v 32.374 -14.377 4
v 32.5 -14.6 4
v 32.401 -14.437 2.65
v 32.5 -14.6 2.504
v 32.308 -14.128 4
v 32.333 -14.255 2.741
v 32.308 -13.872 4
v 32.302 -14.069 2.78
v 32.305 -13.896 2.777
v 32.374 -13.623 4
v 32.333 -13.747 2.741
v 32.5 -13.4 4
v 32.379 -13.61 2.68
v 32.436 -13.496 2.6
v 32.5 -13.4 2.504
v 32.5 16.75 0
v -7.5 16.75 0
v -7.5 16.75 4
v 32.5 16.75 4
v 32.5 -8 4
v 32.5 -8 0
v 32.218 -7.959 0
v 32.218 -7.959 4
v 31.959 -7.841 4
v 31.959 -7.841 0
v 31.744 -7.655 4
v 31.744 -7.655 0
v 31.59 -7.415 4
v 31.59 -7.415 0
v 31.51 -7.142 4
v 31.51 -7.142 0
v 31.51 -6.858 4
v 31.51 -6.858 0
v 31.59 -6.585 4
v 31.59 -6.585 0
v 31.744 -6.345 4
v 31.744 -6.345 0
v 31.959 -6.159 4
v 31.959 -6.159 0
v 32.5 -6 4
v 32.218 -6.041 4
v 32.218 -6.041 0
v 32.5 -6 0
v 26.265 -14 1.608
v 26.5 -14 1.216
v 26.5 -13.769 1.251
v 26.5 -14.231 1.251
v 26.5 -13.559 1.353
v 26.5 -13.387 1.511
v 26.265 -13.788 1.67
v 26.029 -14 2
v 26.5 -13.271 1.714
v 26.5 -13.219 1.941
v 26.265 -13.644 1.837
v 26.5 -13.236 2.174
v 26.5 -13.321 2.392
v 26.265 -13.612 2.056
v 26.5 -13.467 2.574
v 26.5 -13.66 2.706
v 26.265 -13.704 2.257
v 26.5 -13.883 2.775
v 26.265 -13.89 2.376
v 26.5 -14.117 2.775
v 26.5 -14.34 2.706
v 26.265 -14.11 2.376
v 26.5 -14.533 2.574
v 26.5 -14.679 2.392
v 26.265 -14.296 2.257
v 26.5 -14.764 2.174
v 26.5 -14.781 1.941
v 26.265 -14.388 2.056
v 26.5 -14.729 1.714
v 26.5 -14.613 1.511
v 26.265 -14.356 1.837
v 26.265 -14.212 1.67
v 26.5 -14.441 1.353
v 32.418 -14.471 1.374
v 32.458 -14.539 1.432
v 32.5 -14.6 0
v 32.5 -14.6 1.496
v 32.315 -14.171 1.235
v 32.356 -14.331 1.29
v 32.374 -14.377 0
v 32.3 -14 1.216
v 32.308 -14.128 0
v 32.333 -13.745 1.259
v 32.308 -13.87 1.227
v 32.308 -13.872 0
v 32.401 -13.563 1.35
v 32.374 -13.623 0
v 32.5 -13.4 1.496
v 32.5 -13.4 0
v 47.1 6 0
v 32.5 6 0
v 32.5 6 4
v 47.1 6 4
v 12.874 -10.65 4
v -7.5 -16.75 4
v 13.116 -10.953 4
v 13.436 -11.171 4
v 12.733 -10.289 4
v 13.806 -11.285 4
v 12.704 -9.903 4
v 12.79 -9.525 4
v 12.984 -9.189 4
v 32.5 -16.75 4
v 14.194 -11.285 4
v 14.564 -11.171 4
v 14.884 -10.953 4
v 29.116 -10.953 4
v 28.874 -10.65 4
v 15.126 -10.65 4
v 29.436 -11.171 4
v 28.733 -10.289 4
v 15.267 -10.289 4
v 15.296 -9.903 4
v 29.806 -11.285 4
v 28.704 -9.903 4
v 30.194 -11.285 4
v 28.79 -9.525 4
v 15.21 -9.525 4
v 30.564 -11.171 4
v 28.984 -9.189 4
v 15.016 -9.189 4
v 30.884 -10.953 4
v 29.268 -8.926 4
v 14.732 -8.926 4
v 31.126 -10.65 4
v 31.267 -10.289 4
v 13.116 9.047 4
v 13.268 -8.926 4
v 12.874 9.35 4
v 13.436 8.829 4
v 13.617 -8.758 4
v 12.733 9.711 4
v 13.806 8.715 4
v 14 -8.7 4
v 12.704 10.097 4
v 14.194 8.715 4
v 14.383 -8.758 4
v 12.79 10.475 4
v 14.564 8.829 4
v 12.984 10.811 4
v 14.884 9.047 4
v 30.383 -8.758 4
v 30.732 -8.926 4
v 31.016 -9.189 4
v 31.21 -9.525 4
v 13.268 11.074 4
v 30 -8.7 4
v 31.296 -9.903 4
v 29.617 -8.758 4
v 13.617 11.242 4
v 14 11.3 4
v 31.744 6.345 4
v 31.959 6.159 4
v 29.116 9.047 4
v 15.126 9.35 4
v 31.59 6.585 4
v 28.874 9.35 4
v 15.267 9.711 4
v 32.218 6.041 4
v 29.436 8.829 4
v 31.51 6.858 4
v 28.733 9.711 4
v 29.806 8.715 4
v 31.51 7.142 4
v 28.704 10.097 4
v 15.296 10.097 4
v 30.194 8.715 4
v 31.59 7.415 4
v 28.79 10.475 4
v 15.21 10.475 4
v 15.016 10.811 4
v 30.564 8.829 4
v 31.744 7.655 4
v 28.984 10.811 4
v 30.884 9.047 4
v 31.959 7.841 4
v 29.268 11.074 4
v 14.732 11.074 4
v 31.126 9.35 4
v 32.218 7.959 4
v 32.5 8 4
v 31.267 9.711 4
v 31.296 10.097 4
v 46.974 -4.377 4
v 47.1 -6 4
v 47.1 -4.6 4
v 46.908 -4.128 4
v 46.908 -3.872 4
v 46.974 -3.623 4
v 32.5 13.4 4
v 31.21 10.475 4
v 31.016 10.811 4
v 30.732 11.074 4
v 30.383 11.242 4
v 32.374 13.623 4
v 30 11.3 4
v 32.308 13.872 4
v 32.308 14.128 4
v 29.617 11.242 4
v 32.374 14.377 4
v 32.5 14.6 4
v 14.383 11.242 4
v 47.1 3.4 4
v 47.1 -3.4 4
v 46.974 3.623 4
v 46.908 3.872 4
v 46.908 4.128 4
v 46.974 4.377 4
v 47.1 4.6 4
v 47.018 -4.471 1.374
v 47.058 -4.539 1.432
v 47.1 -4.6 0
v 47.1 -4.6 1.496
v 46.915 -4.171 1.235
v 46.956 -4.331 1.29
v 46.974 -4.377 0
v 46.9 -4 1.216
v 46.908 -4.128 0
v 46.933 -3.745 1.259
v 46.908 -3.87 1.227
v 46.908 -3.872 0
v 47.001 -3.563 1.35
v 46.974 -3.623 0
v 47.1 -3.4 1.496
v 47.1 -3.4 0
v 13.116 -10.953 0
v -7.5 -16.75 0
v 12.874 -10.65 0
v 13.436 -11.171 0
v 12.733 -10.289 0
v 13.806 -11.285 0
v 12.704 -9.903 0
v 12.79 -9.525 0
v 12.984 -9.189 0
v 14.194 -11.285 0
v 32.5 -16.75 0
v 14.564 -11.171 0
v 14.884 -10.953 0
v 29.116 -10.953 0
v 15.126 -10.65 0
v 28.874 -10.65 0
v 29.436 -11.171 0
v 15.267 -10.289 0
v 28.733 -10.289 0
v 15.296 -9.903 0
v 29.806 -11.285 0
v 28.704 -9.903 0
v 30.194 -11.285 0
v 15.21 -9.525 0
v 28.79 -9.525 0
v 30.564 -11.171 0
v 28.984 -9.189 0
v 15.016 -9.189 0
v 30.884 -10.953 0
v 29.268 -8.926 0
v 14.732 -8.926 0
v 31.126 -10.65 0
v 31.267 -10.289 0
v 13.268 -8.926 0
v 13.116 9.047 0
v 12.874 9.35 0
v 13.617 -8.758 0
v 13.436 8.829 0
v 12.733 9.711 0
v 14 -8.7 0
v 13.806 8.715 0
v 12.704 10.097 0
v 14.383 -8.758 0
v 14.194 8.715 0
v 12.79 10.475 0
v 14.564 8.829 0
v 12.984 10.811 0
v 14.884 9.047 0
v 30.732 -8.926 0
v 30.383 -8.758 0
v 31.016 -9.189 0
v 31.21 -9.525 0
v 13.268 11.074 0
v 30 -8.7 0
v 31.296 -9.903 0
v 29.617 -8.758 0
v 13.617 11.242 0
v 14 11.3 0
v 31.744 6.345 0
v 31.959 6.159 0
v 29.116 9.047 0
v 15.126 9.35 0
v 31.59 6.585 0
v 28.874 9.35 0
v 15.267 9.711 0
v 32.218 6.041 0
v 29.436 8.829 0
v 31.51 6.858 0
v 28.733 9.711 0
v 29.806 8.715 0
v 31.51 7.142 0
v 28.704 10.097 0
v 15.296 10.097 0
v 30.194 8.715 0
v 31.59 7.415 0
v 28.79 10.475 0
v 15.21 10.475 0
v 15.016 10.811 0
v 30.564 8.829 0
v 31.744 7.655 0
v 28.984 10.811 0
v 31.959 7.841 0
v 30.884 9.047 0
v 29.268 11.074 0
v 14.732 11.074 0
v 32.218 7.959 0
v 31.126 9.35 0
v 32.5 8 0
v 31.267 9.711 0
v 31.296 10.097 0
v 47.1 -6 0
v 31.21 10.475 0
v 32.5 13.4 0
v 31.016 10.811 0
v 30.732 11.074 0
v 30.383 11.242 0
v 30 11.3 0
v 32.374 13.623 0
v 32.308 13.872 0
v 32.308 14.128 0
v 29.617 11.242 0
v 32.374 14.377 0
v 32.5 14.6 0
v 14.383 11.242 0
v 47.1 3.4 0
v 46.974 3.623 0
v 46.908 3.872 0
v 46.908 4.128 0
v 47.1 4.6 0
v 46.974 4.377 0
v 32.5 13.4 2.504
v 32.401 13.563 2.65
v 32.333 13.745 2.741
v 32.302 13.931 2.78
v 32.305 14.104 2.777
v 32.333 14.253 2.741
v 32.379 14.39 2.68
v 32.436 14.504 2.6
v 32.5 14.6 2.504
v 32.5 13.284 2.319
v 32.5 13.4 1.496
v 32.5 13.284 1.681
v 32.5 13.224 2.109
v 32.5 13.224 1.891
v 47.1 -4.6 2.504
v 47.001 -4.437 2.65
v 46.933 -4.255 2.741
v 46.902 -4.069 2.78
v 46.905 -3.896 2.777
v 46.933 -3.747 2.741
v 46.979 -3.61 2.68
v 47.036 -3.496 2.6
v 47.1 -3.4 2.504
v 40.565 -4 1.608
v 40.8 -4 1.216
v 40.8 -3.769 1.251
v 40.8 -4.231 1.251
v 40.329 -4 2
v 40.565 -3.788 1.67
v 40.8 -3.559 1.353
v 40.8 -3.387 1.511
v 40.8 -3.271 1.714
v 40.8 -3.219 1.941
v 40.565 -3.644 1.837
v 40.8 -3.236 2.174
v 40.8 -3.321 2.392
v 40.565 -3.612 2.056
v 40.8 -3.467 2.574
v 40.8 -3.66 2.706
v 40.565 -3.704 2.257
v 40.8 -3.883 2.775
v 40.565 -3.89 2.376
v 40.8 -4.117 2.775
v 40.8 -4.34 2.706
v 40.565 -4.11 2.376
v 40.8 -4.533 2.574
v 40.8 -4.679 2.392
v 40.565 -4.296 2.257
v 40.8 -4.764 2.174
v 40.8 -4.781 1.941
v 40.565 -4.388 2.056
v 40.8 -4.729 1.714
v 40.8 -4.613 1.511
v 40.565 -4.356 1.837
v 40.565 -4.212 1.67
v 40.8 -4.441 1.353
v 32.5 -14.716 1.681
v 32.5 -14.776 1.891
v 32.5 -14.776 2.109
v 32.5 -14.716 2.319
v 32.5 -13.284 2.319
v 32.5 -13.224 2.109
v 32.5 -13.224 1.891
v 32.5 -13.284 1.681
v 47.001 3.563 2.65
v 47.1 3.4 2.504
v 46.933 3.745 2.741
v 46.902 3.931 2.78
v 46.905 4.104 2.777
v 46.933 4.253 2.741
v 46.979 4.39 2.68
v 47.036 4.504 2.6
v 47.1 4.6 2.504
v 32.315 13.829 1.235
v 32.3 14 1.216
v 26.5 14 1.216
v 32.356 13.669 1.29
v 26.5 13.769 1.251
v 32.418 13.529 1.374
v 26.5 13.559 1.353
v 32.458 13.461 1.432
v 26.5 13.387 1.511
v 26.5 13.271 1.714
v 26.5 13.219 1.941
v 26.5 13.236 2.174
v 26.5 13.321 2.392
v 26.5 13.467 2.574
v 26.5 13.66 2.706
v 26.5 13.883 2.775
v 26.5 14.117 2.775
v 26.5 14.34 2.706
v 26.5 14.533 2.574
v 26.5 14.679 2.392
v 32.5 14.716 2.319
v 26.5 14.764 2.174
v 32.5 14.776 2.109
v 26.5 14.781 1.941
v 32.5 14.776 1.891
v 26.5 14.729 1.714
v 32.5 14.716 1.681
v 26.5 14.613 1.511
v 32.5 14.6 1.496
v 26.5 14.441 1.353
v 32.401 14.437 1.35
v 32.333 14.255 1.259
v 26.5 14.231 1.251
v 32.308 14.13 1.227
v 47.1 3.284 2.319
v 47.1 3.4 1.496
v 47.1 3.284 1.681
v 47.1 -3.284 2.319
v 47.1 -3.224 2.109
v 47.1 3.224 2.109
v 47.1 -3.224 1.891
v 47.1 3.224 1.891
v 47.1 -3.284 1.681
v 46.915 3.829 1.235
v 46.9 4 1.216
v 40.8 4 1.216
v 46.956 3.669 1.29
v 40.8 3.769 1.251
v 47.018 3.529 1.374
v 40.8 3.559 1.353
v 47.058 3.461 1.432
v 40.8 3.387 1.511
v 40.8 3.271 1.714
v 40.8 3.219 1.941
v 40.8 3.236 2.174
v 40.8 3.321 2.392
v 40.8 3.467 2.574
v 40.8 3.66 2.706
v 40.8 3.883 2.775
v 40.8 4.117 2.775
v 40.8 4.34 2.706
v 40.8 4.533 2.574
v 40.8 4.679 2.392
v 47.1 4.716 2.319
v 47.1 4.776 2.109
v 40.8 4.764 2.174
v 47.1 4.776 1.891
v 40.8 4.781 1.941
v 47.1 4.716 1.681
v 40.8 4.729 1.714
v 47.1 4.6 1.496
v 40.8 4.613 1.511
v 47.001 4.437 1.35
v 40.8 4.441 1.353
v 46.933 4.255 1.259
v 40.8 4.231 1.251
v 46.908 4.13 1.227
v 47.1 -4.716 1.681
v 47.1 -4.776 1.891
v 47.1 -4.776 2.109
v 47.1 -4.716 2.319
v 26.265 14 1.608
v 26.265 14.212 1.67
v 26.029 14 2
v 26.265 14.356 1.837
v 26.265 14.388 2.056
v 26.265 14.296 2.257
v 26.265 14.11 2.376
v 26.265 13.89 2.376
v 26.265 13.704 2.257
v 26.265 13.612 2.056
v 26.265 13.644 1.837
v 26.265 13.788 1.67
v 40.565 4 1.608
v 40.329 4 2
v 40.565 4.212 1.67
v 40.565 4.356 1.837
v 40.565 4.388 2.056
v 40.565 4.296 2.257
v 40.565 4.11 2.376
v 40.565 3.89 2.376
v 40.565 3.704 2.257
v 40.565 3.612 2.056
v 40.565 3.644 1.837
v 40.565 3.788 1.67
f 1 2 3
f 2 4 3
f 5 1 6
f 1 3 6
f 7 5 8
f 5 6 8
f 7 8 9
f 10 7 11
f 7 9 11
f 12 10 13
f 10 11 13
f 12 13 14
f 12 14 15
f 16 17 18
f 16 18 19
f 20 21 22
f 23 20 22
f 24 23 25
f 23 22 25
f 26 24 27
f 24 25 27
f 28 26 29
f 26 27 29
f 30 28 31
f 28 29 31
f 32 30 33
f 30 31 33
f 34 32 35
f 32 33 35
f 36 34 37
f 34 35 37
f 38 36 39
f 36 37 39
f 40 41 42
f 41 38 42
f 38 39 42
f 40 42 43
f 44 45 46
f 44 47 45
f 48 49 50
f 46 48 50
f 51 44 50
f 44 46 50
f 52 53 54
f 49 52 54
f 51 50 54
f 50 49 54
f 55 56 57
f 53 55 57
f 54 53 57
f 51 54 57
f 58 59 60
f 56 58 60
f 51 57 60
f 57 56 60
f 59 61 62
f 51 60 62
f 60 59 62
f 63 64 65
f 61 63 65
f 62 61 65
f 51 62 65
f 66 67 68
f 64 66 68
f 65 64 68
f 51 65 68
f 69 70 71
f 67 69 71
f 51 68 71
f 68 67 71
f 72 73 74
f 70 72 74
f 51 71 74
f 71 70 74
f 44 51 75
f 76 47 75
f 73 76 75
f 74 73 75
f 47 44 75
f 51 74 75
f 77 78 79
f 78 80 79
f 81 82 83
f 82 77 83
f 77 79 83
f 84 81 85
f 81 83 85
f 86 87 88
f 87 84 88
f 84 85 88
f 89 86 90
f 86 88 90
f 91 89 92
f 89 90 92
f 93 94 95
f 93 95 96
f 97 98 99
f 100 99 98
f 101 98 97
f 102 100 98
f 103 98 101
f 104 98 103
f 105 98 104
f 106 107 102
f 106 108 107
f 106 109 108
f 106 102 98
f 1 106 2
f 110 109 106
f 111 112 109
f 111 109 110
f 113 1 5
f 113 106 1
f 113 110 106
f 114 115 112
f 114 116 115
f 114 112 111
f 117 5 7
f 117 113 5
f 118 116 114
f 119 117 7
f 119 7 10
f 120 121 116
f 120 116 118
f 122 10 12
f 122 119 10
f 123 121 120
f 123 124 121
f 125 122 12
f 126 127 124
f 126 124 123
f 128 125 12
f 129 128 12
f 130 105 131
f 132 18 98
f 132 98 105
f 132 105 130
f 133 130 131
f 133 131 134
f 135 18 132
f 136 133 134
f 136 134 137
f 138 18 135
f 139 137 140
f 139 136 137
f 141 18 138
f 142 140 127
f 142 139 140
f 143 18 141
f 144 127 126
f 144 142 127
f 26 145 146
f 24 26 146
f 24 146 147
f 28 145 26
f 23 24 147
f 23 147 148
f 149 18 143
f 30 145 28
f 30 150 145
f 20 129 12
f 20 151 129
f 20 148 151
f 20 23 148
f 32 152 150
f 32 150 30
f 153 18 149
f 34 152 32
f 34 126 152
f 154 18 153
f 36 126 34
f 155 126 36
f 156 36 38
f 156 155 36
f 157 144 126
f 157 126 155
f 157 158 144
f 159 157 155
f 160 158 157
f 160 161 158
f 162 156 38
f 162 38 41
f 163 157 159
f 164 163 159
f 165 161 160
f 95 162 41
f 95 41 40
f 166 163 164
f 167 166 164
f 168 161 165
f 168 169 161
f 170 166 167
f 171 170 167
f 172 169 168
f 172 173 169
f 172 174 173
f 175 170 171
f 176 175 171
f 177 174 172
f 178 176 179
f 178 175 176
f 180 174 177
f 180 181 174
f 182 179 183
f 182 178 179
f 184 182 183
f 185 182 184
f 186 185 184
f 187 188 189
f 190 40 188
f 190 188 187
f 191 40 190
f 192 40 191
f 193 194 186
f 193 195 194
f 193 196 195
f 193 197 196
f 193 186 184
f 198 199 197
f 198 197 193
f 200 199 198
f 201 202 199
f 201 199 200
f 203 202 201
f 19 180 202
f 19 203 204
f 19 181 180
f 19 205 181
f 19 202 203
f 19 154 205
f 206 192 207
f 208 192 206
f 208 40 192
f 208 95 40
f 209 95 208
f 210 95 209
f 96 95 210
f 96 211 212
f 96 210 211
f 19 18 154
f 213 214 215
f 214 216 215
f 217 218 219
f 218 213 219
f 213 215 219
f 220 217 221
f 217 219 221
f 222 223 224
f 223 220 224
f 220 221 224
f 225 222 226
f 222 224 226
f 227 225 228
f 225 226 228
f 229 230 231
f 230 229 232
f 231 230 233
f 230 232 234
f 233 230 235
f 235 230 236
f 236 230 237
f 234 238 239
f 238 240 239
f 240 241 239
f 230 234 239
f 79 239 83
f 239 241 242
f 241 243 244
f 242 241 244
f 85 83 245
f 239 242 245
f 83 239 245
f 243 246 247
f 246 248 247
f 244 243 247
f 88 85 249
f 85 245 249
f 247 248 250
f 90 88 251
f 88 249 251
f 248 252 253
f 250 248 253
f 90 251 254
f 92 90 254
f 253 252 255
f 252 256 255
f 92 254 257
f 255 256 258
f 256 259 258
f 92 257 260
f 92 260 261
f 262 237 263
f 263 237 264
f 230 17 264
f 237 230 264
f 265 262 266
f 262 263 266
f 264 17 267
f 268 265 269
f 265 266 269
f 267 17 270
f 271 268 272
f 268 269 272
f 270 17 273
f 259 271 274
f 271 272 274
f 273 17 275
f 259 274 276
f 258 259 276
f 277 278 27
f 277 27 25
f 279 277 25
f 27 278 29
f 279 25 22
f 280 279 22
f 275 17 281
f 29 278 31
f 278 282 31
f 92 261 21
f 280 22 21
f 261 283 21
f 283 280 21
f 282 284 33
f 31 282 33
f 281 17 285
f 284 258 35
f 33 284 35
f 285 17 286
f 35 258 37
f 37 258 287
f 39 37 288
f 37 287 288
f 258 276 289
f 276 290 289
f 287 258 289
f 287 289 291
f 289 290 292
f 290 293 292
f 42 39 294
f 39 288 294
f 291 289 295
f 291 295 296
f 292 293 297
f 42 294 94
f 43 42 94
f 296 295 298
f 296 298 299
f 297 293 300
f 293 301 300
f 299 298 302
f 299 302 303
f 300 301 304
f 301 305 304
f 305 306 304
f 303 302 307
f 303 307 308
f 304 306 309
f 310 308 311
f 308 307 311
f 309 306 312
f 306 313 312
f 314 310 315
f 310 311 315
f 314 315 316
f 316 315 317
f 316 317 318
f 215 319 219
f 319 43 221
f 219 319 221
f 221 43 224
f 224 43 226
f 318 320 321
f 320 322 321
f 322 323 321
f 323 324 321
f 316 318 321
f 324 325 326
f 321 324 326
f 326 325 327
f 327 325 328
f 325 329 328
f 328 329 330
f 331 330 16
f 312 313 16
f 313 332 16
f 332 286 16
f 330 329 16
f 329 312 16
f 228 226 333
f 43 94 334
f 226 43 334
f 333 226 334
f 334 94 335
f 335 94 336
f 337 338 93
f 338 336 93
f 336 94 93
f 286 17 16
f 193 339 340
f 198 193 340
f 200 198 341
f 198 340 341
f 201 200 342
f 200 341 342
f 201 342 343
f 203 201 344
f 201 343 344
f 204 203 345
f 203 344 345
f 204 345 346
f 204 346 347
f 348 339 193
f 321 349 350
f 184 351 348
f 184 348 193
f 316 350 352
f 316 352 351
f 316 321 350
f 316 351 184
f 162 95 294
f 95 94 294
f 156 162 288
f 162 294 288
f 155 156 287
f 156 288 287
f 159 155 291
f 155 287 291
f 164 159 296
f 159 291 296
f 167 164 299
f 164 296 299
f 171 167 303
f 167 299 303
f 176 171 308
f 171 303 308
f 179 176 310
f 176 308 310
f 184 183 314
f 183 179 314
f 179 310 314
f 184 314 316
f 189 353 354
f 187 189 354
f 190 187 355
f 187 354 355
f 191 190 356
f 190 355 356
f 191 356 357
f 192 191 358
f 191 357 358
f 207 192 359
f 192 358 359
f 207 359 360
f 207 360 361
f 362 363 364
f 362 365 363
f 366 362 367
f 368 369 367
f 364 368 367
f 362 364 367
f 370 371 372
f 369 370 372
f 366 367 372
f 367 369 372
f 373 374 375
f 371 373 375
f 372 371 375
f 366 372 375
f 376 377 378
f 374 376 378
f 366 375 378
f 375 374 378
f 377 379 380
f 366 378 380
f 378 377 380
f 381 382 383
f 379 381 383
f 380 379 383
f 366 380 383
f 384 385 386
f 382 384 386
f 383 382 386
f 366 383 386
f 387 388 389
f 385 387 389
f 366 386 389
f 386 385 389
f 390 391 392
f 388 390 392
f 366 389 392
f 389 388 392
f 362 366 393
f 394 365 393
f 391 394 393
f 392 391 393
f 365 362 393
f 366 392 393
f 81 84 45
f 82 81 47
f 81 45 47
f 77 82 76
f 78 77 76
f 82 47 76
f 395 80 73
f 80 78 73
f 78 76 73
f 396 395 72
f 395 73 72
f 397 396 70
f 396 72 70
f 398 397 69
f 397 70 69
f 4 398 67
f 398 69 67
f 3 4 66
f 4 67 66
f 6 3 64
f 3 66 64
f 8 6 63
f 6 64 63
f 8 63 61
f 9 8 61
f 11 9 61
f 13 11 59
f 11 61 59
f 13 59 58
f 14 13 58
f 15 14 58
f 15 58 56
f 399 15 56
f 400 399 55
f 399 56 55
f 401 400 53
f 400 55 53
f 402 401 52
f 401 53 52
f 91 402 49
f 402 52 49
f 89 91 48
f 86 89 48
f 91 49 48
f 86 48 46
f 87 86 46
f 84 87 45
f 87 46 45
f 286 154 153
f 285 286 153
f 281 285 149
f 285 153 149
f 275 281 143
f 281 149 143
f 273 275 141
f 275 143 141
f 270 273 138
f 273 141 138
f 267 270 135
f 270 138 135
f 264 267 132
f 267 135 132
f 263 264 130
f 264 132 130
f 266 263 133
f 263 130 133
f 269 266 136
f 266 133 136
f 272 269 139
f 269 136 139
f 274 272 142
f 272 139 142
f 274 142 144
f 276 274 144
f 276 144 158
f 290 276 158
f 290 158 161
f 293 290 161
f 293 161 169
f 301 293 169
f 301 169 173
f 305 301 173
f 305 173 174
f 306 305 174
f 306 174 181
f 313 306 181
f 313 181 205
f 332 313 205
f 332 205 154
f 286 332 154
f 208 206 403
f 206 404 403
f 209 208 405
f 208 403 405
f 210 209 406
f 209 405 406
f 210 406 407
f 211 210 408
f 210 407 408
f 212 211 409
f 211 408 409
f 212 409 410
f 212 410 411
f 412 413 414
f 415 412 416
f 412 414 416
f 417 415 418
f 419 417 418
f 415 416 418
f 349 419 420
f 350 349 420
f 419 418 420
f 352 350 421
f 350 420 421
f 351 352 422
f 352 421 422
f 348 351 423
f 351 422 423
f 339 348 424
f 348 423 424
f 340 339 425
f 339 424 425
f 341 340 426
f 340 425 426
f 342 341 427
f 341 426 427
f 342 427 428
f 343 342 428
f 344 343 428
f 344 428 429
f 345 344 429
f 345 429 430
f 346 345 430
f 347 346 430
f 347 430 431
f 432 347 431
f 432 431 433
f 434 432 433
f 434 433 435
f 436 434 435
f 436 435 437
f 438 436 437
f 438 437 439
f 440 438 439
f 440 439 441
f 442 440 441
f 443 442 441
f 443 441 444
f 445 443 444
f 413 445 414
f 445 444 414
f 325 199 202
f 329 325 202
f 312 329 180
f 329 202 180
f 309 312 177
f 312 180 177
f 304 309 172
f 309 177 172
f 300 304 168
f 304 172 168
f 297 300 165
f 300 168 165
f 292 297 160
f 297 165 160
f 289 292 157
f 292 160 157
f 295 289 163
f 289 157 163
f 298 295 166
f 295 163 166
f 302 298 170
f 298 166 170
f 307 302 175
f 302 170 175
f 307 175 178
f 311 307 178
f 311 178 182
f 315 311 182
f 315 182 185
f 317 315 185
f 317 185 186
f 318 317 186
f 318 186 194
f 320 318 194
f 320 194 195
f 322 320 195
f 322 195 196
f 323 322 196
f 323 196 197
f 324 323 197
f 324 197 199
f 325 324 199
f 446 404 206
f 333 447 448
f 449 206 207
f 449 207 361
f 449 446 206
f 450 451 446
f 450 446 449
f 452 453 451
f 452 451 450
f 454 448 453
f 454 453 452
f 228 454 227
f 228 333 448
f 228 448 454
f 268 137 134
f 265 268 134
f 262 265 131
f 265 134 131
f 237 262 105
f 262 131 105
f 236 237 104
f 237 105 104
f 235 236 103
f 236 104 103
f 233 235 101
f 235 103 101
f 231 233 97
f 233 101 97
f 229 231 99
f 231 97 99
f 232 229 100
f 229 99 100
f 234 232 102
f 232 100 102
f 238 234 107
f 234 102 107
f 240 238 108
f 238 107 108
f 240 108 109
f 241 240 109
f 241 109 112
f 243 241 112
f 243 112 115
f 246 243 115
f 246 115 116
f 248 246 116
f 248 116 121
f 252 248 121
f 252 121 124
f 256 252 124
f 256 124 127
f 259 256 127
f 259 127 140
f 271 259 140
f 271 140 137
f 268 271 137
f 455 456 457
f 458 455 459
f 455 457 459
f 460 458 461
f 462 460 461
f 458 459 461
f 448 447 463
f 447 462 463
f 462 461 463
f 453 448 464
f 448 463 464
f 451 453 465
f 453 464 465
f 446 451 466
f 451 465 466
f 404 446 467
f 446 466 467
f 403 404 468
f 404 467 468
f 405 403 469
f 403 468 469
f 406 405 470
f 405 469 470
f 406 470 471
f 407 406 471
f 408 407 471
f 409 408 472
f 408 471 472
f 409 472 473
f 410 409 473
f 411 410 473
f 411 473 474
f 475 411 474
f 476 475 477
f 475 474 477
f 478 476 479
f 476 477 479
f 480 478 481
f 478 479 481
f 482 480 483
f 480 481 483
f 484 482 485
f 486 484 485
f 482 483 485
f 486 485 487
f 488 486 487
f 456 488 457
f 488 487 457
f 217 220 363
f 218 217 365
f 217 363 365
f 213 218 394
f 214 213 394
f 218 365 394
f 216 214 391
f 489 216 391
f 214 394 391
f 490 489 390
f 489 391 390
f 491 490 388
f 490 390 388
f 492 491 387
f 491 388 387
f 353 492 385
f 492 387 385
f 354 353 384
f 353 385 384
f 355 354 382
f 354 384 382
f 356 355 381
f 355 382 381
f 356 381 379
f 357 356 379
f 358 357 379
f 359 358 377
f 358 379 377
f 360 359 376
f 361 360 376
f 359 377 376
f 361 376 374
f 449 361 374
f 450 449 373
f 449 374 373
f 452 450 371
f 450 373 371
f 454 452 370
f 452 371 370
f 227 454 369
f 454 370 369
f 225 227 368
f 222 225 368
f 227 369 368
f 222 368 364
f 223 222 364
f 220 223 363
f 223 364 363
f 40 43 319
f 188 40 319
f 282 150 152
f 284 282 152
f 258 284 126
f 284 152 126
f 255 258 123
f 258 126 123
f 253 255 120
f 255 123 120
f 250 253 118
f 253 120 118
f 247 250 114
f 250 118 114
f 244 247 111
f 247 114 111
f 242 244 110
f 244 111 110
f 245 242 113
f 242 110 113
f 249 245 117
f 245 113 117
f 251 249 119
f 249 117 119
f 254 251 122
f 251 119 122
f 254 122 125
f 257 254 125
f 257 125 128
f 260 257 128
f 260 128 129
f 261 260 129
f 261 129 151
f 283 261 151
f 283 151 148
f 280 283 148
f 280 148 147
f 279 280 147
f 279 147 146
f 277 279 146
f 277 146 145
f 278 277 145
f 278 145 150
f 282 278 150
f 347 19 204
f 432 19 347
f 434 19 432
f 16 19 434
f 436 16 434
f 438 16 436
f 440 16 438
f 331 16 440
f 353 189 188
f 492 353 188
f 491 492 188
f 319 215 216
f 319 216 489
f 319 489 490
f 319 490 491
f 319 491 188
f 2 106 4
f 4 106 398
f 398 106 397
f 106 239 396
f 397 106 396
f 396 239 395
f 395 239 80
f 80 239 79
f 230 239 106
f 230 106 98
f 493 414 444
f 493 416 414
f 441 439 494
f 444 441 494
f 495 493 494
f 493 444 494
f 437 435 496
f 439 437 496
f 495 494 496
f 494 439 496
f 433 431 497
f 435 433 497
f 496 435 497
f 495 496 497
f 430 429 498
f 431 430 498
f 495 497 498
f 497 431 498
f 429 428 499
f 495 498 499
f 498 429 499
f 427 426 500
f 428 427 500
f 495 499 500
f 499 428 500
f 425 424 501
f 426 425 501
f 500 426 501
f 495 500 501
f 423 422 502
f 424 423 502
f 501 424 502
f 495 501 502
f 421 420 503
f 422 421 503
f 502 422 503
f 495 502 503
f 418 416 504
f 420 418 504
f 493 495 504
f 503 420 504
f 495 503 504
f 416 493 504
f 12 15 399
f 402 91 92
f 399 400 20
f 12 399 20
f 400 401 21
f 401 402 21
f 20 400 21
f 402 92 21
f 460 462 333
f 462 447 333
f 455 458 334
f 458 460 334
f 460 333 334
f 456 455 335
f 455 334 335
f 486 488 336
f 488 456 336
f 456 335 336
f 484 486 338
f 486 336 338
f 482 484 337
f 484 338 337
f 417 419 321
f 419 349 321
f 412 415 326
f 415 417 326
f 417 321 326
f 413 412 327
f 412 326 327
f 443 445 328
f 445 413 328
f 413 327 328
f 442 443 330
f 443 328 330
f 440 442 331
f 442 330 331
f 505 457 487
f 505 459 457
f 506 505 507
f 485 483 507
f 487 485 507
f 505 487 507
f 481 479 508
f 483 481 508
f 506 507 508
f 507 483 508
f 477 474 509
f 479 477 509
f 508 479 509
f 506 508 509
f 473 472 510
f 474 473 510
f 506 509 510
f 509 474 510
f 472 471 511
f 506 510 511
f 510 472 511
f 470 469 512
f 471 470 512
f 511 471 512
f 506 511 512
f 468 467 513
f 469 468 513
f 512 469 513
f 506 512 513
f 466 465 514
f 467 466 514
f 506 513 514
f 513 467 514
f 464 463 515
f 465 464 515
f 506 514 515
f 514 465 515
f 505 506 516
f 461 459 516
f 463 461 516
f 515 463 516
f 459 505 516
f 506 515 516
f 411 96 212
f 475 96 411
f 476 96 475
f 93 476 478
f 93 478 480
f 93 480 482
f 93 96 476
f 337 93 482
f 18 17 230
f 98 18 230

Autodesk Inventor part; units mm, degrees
ref_plane "YZ Plane" through (0, 0, 0) normal (1, 0, 0) x (0, 1, 0)
ref_plane "XZ Plane" through (0, 0, 0) normal (0, 1, 0) x (-1, 0, 0)
ref_plane "XY Plane" through (0, 0, 0) normal (0, 0, 1) x (1, 0, 0)
sketch "スケッチ1" plane through (0, 0, 0) normal (0, 0, 1) x (1, 0, 0)
  line L0 (14, 10) -> (30, 10) construction
  line L1 (30, 10) -> (30, -10) construction
  line L2 (30, -10) -> (14, -10) construction
  line L3 (14, -10) -> (14, 10) construction
  line L4 (0, 0) -> (42.5052, 0) construction
  line L5 (-7.5, 16.75) -> (32.5, 16.75)
  line L6 (47.1, 6) -> (47.1, 4.6)
  line L7 (32.5, -16.75) -> (-7.5, -16.75)
  line L8 (32.5, 16.75) -> (32.5, 14.6)
  line L9 (32.5, 8) -> (32.5, 6) construction
  line L10 (32.5, 6) -> (47.1, 6)
  arc A0 (32.5, 8) -> (32.5, 6) centre (32.5, 7) ccw
  line L11 (32.5, -16.75) -> (32.5, -14.6)
  line L12 (32.5, -6) -> (47.1, -6)
  arc A1 (32.5, -6) -> (32.5, -8) centre (32.5, -7) ccw
  line L13 (32.5, 6) -> (32.5, -6) construction
  line L14 (32.5, -8) -> (32.5, -6) construction
  arc A2 (47.1, 4.6) -> (47.1, 3.4) centre (47.9, 4) ccw
  arc A3 (47.1, -3.4) -> (47.1, -4.6) centre (47.9, -4) ccw
  line L15 (47.1, 4.6) -> (47.1, 3.4) construction
  line L16 (47.1, 3.4) -> (47.1, -3.4)
  line L17 (47.1, -3.4) -> (47.1, -4.6) construction
  line L18 (47.1, -4.6) -> (47.1, -6)
  arc A4 (32.5, 14.6) -> (32.5, 13.4) centre (33.3, 14) ccw
  line L19 (32.5, 13.4) -> (32.5, 8)
  line L20 (32.5, 14.6) -> (32.5, 13.4) construction
  line L21 (33.7, 6) -> (33.7, -6) construction
  arc A5 (32.5, -13.4) -> (32.5, -14.6) centre (33.3, -14) ccw
  line L22 (32.5, -13.4) -> (32.5, -8)
  line L23 (32.5, -14.6) -> (32.5, -13.4) construction
  line L24 (-7.5, 16.75) -> (-7.5, -16.75)
  line L25 (35.7, 6) -> (35.7, -6) construction
  dimension "d0" = 20
  dimension "d1" = 16
  dimension "d3" = 1
  dimension "d4" = 12
  dimension "d5" = 2.5
  dimension "d7" = 1
  dimension "d8" = 0.8
  dimension "d9" = 8
  dimension "d10" = 0.8
  dimension "d11" = 28
  dimension "d12" = 33.5
  dimension "d29" = 1.2
  dimension "d32" = 40
  dimension "d34" = 32.5
  dimension "d36" = 2
  dimension "d37" = 11.4
extrude "押し出し1" add sketch "スケッチ1" along normal blind 4
hole "穴1" at (14, 10, 0) at (30, 10, 0) at (30, -10, 0) at (14, -10, 0) direction (0, 0, 1) diameter 2.6 end through all clearance for "Countersunk Raised Head Screw ISO 2010/7047" size "M2.5" standard "ISO"
sketch "スケッチ2" plane through (32.5, 8, 0) normal (1, 0, 0) x (0, 0, -1)
  line L0 (0, 6.6) -> (-4, 6.6) construction
  line L1 (0, 5.4) -> (-4, 5.4) construction
  line L2 (-4, 6.6) -> (0, 5.4) construction
  line L3 (0, -21.4) -> (-4, -21.4) construction
  line L4 (0, -22.6) -> (-4, -22.6) construction
  line L5 (-4, -21.4) -> (0, -22.6) construction
  point P0 (0, -8)
  point P1 (-2, 6)
  point P2 (-2, -22)
hole "穴2" at (32.5, 14, 2) at (32.5, -14, 2) direction (-1, 0, 0) diameter 1.567 depth 6 tip angle 118 thread size "M2x0.4" class "6H" standard "ISO Metric profile"
sketch "スケッチ3" plane through (47.1, -3.4, 0) normal (1, 0, 0) x (0, 0, -1)
  line L0 (0, -1.2) -> (-4, -1.2) construction
  line L1 (0, 0) -> (-4, 0) construction
  line L2 (0, -1.2) -> (-4, 0) construction
  line L3 (0, 6.8) -> (-4, 6.8) construction
  line L4 (0, 8) -> (-4, 8) construction
  line L5 (0, 6.8) -> (-4, 8) construction
  point P0 (0, 3.4)
  point P1 (-2, -0.6)
  point P2 (-2, 7.4)
hole "穴3" at (47.1, -4, 2) at (47.1, 4, 2) direction (-1, 0, 0) diameter 1.567 depth 6.3 tip angle 118 thread size "M2x0.4" class "6H" standard "ISO Metric profile"
properties part number "SERVO_MOUNT_TIP"
